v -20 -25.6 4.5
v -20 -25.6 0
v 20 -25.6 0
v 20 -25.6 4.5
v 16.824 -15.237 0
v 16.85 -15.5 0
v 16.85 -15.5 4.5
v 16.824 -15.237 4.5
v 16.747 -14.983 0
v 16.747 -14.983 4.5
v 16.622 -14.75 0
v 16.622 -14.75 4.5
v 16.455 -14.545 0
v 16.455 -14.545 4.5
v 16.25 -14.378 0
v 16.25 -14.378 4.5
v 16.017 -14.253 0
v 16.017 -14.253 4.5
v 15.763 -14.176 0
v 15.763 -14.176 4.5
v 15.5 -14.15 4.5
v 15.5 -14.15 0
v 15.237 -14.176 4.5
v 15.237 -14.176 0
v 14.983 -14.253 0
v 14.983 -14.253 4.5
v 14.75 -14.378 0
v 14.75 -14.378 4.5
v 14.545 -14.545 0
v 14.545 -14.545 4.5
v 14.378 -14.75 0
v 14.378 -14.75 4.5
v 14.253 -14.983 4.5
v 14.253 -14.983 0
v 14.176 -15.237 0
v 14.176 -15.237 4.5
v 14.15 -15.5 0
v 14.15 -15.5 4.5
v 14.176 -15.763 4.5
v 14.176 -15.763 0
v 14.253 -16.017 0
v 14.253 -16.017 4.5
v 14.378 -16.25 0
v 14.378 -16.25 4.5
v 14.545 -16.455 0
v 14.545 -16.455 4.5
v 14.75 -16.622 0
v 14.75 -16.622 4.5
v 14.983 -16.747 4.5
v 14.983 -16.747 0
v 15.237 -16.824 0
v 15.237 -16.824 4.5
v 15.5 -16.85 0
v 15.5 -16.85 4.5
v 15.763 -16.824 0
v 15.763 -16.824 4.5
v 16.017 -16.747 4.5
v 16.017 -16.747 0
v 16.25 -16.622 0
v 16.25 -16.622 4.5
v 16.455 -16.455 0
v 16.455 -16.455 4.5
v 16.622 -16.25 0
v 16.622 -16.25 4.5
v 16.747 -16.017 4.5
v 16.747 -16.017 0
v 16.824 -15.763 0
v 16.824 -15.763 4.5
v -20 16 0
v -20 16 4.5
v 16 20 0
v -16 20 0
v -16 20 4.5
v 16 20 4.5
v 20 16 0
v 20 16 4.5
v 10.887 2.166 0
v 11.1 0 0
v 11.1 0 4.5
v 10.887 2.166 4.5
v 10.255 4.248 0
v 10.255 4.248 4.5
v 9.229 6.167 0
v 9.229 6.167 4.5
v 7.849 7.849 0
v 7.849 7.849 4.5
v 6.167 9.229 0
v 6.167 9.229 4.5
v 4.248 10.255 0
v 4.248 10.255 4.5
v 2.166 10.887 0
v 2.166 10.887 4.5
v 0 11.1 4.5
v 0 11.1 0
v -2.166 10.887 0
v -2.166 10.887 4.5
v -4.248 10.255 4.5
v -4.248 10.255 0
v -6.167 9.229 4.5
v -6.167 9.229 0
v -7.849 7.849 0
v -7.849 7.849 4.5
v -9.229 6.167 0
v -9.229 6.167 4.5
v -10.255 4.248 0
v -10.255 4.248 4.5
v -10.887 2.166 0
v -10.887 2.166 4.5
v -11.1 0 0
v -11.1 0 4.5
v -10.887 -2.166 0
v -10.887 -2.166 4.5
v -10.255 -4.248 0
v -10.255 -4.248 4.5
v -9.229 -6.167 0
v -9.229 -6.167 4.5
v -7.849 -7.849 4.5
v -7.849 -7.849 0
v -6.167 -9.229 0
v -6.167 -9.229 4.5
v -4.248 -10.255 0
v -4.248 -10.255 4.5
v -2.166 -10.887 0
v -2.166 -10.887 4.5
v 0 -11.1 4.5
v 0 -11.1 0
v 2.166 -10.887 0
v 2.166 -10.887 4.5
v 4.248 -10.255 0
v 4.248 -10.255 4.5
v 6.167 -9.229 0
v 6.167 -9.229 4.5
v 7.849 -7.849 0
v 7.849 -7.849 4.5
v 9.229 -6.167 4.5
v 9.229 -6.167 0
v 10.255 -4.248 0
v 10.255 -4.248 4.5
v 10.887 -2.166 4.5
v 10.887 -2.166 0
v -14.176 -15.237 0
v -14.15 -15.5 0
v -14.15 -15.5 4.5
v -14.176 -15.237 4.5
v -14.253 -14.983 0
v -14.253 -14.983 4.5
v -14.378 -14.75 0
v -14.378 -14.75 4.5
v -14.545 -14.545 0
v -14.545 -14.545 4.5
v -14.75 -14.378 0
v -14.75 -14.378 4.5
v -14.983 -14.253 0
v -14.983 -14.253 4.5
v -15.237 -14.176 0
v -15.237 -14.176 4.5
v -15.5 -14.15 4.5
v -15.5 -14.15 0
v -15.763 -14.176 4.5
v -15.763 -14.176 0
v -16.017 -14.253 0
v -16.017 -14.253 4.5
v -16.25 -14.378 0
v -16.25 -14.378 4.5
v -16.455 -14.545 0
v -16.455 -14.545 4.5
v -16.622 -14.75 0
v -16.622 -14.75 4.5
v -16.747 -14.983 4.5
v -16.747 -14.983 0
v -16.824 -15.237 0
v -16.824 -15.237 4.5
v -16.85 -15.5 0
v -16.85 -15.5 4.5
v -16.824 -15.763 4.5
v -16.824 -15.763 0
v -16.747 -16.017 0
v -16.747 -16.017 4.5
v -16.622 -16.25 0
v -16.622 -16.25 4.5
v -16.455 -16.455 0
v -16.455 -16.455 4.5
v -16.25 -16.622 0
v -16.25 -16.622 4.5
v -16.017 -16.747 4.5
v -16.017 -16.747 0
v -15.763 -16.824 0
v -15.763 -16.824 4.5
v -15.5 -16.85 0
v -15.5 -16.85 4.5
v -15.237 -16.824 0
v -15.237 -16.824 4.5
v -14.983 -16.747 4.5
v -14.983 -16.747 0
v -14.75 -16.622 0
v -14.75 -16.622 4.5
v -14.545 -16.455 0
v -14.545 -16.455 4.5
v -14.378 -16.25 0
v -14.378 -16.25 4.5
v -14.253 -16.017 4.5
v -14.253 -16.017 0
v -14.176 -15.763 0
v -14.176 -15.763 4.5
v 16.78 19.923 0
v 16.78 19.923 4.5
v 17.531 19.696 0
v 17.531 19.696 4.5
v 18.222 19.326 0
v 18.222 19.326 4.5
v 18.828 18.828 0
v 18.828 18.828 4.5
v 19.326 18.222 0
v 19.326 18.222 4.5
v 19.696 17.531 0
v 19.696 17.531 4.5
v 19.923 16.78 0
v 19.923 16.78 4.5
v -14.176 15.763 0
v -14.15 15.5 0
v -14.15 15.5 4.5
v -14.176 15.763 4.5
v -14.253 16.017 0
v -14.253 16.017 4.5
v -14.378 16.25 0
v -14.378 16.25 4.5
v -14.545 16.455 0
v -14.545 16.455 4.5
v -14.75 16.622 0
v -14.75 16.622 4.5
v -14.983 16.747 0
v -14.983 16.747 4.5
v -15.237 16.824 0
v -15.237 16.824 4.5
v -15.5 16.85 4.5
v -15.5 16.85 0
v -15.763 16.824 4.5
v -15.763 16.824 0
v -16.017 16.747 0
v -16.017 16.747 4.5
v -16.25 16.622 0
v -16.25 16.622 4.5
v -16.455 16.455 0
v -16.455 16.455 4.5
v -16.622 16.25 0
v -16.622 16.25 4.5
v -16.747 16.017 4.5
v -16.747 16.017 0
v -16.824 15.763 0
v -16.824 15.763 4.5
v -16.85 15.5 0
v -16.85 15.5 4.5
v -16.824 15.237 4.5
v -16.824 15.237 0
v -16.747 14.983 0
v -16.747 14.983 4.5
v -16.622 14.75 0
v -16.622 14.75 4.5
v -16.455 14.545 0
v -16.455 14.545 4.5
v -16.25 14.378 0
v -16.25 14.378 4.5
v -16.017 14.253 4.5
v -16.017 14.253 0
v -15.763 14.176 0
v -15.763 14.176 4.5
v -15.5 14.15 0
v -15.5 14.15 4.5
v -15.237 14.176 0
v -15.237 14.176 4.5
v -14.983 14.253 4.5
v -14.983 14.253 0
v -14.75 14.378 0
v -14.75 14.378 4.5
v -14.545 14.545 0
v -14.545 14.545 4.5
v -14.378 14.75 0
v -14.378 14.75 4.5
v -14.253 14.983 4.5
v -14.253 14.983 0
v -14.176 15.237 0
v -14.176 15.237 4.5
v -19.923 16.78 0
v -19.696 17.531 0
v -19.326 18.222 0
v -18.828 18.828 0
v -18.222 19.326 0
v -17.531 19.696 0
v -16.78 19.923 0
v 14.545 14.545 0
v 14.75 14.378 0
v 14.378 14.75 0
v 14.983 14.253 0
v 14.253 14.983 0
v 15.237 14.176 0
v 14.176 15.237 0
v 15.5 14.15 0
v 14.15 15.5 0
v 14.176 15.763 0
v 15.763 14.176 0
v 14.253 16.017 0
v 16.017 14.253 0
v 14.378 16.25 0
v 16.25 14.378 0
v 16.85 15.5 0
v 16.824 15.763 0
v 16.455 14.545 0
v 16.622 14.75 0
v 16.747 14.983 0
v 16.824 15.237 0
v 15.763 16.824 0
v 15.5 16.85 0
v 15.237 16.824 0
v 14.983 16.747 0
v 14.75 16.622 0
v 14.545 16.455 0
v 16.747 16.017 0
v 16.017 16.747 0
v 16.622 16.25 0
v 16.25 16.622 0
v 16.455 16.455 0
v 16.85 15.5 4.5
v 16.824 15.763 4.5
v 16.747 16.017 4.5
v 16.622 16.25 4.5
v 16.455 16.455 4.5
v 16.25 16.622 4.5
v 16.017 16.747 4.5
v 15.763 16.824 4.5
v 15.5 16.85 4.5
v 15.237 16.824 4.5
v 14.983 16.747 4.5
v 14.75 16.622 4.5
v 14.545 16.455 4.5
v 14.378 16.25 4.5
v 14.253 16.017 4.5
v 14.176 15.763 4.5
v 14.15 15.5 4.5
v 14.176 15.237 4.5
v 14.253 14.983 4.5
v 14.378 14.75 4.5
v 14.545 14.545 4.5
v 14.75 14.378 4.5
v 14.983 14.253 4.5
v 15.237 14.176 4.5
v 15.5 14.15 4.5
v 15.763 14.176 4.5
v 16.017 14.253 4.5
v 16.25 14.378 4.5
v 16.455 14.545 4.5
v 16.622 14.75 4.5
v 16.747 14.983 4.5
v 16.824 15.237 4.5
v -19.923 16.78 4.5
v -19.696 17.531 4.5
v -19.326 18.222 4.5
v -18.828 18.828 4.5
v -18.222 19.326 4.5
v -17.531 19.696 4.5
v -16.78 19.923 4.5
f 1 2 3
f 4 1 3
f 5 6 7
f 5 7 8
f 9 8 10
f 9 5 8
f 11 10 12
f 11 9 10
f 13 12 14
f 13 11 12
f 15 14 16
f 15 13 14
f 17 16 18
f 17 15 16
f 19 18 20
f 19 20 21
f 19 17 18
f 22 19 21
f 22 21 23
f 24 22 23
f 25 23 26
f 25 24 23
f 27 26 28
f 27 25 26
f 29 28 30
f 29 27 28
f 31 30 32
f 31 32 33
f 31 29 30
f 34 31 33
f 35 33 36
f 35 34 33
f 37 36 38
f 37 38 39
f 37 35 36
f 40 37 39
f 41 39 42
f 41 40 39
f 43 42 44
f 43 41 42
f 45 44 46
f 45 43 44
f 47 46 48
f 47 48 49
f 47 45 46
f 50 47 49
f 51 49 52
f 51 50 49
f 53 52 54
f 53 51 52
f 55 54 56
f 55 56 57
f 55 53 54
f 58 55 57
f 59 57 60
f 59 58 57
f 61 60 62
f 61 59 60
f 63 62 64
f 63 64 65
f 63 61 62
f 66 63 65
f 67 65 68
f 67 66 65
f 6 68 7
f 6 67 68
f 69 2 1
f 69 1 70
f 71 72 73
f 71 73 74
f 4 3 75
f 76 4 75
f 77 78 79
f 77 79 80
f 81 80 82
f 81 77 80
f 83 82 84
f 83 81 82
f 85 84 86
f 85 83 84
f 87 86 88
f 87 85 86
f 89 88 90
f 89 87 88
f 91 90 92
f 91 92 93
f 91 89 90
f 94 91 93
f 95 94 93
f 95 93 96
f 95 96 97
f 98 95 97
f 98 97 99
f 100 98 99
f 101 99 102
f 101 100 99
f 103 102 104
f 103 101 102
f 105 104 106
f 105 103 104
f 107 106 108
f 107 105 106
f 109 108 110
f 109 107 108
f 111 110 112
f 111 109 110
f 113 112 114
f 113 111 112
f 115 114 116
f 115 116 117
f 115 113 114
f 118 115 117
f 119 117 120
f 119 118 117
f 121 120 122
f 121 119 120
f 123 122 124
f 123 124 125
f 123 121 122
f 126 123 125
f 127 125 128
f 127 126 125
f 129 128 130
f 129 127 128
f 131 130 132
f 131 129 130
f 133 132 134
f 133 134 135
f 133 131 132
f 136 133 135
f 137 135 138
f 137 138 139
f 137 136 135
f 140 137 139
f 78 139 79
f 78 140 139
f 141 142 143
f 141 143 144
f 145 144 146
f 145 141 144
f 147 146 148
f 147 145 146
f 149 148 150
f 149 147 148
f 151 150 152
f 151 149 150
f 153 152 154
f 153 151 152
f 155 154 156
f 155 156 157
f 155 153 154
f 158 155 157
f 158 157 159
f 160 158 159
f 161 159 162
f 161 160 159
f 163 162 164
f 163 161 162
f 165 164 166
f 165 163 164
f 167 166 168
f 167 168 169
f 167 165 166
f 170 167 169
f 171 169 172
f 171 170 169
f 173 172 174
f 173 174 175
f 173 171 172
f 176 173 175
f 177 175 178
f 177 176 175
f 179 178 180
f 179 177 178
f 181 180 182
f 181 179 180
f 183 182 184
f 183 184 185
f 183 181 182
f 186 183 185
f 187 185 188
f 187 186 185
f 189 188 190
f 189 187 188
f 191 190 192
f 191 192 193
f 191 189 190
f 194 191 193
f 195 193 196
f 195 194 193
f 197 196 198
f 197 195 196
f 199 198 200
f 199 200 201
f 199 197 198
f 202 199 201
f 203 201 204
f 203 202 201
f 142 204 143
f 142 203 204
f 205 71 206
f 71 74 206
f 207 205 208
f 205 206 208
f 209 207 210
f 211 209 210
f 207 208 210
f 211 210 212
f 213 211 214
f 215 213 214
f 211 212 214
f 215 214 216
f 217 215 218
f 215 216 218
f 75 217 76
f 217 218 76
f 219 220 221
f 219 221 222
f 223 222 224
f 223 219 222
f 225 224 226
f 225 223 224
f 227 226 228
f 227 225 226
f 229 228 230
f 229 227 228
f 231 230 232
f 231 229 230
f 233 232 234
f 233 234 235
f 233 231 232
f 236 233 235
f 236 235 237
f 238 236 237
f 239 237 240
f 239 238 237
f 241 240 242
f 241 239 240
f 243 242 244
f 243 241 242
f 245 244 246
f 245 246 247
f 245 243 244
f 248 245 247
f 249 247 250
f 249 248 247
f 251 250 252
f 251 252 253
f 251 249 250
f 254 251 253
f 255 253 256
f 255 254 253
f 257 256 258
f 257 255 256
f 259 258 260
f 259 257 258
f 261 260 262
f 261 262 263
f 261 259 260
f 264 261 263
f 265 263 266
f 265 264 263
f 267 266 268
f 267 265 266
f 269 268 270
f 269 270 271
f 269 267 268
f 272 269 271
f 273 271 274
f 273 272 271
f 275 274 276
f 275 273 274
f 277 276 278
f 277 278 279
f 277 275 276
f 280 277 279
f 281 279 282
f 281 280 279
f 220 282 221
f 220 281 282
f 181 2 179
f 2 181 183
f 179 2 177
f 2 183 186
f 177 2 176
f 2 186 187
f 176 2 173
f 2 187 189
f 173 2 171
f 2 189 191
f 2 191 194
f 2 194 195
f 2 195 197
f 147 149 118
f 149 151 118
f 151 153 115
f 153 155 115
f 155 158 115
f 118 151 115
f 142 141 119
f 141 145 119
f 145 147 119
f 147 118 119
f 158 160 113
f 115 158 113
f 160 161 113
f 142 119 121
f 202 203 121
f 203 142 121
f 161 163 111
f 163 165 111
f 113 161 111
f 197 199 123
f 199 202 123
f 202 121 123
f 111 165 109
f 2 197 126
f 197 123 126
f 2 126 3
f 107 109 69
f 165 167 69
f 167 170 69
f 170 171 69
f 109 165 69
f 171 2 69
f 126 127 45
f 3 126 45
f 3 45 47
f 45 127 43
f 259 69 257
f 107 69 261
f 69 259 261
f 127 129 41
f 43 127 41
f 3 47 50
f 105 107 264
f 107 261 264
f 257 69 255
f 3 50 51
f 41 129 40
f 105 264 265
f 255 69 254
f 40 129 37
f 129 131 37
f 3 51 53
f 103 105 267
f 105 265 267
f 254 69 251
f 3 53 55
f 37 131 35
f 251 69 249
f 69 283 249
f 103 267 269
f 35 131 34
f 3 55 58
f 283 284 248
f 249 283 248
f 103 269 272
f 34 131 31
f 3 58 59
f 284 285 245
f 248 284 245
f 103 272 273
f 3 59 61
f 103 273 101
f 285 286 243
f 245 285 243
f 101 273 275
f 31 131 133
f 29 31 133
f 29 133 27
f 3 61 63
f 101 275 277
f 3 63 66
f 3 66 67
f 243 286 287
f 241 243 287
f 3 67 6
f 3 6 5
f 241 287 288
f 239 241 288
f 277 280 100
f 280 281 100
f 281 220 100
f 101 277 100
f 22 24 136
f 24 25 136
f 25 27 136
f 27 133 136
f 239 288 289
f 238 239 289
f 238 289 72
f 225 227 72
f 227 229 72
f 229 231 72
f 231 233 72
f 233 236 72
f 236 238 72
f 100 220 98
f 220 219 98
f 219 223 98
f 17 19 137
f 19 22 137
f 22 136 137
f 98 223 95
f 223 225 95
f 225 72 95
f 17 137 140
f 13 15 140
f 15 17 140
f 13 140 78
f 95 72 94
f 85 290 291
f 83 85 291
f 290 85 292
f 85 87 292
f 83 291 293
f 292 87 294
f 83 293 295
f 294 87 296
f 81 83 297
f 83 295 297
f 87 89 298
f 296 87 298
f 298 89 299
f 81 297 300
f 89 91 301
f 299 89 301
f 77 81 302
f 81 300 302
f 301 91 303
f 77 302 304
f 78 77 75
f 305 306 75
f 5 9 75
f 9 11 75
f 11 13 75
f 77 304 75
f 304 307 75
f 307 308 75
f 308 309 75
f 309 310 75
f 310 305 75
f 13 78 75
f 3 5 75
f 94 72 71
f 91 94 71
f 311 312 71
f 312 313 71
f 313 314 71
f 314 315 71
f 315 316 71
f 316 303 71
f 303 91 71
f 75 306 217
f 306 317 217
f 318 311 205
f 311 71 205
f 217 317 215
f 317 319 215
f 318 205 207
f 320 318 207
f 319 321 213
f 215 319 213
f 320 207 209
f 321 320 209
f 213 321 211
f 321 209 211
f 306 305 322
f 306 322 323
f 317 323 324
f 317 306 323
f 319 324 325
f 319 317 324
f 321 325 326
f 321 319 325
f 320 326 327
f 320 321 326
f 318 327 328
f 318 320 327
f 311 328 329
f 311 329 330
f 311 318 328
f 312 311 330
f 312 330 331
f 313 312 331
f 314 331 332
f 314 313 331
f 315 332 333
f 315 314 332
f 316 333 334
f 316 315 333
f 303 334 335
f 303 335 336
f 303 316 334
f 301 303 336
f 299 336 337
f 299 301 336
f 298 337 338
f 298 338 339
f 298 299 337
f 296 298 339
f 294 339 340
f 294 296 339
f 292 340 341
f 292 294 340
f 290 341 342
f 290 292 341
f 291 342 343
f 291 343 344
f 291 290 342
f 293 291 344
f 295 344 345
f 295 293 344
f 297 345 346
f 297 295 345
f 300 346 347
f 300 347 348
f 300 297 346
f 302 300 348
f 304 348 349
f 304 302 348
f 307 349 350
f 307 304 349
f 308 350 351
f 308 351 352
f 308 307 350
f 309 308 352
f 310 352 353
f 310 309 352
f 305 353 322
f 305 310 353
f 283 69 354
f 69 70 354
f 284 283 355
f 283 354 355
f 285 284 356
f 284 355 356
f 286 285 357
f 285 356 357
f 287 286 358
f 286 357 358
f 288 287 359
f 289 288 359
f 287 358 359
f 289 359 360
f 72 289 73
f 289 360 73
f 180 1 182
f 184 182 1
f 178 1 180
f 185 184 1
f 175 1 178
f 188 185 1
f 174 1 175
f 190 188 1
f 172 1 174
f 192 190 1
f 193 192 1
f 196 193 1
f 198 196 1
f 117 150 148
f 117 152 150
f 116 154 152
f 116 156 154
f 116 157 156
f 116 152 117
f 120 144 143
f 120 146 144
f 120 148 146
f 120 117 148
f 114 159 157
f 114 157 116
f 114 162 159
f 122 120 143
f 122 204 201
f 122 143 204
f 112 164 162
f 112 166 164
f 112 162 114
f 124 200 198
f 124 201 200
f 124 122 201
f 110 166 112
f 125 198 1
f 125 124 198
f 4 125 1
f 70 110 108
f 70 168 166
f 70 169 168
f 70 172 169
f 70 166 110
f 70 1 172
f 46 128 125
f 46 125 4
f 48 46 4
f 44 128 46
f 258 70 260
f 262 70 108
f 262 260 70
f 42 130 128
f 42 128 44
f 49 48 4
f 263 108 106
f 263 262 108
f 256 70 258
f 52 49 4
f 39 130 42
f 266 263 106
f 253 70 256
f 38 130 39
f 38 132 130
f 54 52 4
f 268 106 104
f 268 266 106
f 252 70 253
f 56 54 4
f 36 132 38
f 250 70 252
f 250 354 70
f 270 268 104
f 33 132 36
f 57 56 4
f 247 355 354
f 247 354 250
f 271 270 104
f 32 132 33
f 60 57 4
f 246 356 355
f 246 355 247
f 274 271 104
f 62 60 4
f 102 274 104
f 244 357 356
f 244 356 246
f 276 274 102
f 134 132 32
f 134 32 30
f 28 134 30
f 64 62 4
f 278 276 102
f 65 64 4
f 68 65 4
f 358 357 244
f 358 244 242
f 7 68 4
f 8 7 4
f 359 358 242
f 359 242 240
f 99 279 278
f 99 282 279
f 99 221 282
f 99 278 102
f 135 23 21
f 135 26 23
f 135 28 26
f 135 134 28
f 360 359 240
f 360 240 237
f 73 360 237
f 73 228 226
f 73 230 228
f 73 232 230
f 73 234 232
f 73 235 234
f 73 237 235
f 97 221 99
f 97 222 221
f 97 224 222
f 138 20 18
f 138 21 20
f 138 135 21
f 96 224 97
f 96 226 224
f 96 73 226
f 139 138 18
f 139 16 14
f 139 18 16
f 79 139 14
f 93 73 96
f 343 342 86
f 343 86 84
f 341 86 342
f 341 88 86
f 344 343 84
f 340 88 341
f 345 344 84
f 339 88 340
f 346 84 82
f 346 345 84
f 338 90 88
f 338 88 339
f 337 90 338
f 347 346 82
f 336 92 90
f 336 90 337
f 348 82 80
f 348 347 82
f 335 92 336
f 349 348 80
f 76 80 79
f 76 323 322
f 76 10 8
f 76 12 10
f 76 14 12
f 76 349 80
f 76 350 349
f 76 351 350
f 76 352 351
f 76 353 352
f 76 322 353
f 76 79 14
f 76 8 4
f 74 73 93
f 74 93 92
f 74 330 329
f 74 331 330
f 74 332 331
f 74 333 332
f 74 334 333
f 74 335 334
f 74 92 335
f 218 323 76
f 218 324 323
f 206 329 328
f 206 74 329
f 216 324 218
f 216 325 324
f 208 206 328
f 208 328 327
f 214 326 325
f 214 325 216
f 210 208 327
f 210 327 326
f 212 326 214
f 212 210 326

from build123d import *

# Parameters (mm, degrees)
SKETCH1_W           = 40
SKETCH1_H           = 45.6
SKETCH1_R           = 1.35
SKETCH1_R_2         = 11.1
BOSS_EXTRUDE1_DEPTH = 4.5
FILLET1_R           = 4


with BuildPart() as part:
    # Sketch1 → Boss-Extrude1 (new body)
    with BuildSketch(Plane.XY):
        with Locations((0, -2.8)):
            Rectangle(SKETCH1_W, SKETCH1_H)
        with Locations((-15.5, -15.5)):
            Circle(SKETCH1_R, mode=Mode.SUBTRACT)
        with Locations((15.5, -15.5)):
            Circle(SKETCH1_R, mode=Mode.SUBTRACT)
        Circle(SKETCH1_R_2, mode=Mode.SUBTRACT)
        with Locations((-15.5, 15.5)):
            Circle(SKETCH1_R, mode=Mode.SUBTRACT)
        with Locations((15.5, 15.5)):
            Circle(SKETCH1_R, mode=Mode.SUBTRACT)
    extrude(amount=BOSS_EXTRUDE1_DEPTH)

    # Fillet1
    fillet1_edges = [part.edges().sort_by_distance(p)[0] for p in [
        (-20, 20, 2.25),
        (20, 20, 2.25),
    ]]
    fillet(fillet1_edges, radius=FILLET1_R)


solid = part.part
